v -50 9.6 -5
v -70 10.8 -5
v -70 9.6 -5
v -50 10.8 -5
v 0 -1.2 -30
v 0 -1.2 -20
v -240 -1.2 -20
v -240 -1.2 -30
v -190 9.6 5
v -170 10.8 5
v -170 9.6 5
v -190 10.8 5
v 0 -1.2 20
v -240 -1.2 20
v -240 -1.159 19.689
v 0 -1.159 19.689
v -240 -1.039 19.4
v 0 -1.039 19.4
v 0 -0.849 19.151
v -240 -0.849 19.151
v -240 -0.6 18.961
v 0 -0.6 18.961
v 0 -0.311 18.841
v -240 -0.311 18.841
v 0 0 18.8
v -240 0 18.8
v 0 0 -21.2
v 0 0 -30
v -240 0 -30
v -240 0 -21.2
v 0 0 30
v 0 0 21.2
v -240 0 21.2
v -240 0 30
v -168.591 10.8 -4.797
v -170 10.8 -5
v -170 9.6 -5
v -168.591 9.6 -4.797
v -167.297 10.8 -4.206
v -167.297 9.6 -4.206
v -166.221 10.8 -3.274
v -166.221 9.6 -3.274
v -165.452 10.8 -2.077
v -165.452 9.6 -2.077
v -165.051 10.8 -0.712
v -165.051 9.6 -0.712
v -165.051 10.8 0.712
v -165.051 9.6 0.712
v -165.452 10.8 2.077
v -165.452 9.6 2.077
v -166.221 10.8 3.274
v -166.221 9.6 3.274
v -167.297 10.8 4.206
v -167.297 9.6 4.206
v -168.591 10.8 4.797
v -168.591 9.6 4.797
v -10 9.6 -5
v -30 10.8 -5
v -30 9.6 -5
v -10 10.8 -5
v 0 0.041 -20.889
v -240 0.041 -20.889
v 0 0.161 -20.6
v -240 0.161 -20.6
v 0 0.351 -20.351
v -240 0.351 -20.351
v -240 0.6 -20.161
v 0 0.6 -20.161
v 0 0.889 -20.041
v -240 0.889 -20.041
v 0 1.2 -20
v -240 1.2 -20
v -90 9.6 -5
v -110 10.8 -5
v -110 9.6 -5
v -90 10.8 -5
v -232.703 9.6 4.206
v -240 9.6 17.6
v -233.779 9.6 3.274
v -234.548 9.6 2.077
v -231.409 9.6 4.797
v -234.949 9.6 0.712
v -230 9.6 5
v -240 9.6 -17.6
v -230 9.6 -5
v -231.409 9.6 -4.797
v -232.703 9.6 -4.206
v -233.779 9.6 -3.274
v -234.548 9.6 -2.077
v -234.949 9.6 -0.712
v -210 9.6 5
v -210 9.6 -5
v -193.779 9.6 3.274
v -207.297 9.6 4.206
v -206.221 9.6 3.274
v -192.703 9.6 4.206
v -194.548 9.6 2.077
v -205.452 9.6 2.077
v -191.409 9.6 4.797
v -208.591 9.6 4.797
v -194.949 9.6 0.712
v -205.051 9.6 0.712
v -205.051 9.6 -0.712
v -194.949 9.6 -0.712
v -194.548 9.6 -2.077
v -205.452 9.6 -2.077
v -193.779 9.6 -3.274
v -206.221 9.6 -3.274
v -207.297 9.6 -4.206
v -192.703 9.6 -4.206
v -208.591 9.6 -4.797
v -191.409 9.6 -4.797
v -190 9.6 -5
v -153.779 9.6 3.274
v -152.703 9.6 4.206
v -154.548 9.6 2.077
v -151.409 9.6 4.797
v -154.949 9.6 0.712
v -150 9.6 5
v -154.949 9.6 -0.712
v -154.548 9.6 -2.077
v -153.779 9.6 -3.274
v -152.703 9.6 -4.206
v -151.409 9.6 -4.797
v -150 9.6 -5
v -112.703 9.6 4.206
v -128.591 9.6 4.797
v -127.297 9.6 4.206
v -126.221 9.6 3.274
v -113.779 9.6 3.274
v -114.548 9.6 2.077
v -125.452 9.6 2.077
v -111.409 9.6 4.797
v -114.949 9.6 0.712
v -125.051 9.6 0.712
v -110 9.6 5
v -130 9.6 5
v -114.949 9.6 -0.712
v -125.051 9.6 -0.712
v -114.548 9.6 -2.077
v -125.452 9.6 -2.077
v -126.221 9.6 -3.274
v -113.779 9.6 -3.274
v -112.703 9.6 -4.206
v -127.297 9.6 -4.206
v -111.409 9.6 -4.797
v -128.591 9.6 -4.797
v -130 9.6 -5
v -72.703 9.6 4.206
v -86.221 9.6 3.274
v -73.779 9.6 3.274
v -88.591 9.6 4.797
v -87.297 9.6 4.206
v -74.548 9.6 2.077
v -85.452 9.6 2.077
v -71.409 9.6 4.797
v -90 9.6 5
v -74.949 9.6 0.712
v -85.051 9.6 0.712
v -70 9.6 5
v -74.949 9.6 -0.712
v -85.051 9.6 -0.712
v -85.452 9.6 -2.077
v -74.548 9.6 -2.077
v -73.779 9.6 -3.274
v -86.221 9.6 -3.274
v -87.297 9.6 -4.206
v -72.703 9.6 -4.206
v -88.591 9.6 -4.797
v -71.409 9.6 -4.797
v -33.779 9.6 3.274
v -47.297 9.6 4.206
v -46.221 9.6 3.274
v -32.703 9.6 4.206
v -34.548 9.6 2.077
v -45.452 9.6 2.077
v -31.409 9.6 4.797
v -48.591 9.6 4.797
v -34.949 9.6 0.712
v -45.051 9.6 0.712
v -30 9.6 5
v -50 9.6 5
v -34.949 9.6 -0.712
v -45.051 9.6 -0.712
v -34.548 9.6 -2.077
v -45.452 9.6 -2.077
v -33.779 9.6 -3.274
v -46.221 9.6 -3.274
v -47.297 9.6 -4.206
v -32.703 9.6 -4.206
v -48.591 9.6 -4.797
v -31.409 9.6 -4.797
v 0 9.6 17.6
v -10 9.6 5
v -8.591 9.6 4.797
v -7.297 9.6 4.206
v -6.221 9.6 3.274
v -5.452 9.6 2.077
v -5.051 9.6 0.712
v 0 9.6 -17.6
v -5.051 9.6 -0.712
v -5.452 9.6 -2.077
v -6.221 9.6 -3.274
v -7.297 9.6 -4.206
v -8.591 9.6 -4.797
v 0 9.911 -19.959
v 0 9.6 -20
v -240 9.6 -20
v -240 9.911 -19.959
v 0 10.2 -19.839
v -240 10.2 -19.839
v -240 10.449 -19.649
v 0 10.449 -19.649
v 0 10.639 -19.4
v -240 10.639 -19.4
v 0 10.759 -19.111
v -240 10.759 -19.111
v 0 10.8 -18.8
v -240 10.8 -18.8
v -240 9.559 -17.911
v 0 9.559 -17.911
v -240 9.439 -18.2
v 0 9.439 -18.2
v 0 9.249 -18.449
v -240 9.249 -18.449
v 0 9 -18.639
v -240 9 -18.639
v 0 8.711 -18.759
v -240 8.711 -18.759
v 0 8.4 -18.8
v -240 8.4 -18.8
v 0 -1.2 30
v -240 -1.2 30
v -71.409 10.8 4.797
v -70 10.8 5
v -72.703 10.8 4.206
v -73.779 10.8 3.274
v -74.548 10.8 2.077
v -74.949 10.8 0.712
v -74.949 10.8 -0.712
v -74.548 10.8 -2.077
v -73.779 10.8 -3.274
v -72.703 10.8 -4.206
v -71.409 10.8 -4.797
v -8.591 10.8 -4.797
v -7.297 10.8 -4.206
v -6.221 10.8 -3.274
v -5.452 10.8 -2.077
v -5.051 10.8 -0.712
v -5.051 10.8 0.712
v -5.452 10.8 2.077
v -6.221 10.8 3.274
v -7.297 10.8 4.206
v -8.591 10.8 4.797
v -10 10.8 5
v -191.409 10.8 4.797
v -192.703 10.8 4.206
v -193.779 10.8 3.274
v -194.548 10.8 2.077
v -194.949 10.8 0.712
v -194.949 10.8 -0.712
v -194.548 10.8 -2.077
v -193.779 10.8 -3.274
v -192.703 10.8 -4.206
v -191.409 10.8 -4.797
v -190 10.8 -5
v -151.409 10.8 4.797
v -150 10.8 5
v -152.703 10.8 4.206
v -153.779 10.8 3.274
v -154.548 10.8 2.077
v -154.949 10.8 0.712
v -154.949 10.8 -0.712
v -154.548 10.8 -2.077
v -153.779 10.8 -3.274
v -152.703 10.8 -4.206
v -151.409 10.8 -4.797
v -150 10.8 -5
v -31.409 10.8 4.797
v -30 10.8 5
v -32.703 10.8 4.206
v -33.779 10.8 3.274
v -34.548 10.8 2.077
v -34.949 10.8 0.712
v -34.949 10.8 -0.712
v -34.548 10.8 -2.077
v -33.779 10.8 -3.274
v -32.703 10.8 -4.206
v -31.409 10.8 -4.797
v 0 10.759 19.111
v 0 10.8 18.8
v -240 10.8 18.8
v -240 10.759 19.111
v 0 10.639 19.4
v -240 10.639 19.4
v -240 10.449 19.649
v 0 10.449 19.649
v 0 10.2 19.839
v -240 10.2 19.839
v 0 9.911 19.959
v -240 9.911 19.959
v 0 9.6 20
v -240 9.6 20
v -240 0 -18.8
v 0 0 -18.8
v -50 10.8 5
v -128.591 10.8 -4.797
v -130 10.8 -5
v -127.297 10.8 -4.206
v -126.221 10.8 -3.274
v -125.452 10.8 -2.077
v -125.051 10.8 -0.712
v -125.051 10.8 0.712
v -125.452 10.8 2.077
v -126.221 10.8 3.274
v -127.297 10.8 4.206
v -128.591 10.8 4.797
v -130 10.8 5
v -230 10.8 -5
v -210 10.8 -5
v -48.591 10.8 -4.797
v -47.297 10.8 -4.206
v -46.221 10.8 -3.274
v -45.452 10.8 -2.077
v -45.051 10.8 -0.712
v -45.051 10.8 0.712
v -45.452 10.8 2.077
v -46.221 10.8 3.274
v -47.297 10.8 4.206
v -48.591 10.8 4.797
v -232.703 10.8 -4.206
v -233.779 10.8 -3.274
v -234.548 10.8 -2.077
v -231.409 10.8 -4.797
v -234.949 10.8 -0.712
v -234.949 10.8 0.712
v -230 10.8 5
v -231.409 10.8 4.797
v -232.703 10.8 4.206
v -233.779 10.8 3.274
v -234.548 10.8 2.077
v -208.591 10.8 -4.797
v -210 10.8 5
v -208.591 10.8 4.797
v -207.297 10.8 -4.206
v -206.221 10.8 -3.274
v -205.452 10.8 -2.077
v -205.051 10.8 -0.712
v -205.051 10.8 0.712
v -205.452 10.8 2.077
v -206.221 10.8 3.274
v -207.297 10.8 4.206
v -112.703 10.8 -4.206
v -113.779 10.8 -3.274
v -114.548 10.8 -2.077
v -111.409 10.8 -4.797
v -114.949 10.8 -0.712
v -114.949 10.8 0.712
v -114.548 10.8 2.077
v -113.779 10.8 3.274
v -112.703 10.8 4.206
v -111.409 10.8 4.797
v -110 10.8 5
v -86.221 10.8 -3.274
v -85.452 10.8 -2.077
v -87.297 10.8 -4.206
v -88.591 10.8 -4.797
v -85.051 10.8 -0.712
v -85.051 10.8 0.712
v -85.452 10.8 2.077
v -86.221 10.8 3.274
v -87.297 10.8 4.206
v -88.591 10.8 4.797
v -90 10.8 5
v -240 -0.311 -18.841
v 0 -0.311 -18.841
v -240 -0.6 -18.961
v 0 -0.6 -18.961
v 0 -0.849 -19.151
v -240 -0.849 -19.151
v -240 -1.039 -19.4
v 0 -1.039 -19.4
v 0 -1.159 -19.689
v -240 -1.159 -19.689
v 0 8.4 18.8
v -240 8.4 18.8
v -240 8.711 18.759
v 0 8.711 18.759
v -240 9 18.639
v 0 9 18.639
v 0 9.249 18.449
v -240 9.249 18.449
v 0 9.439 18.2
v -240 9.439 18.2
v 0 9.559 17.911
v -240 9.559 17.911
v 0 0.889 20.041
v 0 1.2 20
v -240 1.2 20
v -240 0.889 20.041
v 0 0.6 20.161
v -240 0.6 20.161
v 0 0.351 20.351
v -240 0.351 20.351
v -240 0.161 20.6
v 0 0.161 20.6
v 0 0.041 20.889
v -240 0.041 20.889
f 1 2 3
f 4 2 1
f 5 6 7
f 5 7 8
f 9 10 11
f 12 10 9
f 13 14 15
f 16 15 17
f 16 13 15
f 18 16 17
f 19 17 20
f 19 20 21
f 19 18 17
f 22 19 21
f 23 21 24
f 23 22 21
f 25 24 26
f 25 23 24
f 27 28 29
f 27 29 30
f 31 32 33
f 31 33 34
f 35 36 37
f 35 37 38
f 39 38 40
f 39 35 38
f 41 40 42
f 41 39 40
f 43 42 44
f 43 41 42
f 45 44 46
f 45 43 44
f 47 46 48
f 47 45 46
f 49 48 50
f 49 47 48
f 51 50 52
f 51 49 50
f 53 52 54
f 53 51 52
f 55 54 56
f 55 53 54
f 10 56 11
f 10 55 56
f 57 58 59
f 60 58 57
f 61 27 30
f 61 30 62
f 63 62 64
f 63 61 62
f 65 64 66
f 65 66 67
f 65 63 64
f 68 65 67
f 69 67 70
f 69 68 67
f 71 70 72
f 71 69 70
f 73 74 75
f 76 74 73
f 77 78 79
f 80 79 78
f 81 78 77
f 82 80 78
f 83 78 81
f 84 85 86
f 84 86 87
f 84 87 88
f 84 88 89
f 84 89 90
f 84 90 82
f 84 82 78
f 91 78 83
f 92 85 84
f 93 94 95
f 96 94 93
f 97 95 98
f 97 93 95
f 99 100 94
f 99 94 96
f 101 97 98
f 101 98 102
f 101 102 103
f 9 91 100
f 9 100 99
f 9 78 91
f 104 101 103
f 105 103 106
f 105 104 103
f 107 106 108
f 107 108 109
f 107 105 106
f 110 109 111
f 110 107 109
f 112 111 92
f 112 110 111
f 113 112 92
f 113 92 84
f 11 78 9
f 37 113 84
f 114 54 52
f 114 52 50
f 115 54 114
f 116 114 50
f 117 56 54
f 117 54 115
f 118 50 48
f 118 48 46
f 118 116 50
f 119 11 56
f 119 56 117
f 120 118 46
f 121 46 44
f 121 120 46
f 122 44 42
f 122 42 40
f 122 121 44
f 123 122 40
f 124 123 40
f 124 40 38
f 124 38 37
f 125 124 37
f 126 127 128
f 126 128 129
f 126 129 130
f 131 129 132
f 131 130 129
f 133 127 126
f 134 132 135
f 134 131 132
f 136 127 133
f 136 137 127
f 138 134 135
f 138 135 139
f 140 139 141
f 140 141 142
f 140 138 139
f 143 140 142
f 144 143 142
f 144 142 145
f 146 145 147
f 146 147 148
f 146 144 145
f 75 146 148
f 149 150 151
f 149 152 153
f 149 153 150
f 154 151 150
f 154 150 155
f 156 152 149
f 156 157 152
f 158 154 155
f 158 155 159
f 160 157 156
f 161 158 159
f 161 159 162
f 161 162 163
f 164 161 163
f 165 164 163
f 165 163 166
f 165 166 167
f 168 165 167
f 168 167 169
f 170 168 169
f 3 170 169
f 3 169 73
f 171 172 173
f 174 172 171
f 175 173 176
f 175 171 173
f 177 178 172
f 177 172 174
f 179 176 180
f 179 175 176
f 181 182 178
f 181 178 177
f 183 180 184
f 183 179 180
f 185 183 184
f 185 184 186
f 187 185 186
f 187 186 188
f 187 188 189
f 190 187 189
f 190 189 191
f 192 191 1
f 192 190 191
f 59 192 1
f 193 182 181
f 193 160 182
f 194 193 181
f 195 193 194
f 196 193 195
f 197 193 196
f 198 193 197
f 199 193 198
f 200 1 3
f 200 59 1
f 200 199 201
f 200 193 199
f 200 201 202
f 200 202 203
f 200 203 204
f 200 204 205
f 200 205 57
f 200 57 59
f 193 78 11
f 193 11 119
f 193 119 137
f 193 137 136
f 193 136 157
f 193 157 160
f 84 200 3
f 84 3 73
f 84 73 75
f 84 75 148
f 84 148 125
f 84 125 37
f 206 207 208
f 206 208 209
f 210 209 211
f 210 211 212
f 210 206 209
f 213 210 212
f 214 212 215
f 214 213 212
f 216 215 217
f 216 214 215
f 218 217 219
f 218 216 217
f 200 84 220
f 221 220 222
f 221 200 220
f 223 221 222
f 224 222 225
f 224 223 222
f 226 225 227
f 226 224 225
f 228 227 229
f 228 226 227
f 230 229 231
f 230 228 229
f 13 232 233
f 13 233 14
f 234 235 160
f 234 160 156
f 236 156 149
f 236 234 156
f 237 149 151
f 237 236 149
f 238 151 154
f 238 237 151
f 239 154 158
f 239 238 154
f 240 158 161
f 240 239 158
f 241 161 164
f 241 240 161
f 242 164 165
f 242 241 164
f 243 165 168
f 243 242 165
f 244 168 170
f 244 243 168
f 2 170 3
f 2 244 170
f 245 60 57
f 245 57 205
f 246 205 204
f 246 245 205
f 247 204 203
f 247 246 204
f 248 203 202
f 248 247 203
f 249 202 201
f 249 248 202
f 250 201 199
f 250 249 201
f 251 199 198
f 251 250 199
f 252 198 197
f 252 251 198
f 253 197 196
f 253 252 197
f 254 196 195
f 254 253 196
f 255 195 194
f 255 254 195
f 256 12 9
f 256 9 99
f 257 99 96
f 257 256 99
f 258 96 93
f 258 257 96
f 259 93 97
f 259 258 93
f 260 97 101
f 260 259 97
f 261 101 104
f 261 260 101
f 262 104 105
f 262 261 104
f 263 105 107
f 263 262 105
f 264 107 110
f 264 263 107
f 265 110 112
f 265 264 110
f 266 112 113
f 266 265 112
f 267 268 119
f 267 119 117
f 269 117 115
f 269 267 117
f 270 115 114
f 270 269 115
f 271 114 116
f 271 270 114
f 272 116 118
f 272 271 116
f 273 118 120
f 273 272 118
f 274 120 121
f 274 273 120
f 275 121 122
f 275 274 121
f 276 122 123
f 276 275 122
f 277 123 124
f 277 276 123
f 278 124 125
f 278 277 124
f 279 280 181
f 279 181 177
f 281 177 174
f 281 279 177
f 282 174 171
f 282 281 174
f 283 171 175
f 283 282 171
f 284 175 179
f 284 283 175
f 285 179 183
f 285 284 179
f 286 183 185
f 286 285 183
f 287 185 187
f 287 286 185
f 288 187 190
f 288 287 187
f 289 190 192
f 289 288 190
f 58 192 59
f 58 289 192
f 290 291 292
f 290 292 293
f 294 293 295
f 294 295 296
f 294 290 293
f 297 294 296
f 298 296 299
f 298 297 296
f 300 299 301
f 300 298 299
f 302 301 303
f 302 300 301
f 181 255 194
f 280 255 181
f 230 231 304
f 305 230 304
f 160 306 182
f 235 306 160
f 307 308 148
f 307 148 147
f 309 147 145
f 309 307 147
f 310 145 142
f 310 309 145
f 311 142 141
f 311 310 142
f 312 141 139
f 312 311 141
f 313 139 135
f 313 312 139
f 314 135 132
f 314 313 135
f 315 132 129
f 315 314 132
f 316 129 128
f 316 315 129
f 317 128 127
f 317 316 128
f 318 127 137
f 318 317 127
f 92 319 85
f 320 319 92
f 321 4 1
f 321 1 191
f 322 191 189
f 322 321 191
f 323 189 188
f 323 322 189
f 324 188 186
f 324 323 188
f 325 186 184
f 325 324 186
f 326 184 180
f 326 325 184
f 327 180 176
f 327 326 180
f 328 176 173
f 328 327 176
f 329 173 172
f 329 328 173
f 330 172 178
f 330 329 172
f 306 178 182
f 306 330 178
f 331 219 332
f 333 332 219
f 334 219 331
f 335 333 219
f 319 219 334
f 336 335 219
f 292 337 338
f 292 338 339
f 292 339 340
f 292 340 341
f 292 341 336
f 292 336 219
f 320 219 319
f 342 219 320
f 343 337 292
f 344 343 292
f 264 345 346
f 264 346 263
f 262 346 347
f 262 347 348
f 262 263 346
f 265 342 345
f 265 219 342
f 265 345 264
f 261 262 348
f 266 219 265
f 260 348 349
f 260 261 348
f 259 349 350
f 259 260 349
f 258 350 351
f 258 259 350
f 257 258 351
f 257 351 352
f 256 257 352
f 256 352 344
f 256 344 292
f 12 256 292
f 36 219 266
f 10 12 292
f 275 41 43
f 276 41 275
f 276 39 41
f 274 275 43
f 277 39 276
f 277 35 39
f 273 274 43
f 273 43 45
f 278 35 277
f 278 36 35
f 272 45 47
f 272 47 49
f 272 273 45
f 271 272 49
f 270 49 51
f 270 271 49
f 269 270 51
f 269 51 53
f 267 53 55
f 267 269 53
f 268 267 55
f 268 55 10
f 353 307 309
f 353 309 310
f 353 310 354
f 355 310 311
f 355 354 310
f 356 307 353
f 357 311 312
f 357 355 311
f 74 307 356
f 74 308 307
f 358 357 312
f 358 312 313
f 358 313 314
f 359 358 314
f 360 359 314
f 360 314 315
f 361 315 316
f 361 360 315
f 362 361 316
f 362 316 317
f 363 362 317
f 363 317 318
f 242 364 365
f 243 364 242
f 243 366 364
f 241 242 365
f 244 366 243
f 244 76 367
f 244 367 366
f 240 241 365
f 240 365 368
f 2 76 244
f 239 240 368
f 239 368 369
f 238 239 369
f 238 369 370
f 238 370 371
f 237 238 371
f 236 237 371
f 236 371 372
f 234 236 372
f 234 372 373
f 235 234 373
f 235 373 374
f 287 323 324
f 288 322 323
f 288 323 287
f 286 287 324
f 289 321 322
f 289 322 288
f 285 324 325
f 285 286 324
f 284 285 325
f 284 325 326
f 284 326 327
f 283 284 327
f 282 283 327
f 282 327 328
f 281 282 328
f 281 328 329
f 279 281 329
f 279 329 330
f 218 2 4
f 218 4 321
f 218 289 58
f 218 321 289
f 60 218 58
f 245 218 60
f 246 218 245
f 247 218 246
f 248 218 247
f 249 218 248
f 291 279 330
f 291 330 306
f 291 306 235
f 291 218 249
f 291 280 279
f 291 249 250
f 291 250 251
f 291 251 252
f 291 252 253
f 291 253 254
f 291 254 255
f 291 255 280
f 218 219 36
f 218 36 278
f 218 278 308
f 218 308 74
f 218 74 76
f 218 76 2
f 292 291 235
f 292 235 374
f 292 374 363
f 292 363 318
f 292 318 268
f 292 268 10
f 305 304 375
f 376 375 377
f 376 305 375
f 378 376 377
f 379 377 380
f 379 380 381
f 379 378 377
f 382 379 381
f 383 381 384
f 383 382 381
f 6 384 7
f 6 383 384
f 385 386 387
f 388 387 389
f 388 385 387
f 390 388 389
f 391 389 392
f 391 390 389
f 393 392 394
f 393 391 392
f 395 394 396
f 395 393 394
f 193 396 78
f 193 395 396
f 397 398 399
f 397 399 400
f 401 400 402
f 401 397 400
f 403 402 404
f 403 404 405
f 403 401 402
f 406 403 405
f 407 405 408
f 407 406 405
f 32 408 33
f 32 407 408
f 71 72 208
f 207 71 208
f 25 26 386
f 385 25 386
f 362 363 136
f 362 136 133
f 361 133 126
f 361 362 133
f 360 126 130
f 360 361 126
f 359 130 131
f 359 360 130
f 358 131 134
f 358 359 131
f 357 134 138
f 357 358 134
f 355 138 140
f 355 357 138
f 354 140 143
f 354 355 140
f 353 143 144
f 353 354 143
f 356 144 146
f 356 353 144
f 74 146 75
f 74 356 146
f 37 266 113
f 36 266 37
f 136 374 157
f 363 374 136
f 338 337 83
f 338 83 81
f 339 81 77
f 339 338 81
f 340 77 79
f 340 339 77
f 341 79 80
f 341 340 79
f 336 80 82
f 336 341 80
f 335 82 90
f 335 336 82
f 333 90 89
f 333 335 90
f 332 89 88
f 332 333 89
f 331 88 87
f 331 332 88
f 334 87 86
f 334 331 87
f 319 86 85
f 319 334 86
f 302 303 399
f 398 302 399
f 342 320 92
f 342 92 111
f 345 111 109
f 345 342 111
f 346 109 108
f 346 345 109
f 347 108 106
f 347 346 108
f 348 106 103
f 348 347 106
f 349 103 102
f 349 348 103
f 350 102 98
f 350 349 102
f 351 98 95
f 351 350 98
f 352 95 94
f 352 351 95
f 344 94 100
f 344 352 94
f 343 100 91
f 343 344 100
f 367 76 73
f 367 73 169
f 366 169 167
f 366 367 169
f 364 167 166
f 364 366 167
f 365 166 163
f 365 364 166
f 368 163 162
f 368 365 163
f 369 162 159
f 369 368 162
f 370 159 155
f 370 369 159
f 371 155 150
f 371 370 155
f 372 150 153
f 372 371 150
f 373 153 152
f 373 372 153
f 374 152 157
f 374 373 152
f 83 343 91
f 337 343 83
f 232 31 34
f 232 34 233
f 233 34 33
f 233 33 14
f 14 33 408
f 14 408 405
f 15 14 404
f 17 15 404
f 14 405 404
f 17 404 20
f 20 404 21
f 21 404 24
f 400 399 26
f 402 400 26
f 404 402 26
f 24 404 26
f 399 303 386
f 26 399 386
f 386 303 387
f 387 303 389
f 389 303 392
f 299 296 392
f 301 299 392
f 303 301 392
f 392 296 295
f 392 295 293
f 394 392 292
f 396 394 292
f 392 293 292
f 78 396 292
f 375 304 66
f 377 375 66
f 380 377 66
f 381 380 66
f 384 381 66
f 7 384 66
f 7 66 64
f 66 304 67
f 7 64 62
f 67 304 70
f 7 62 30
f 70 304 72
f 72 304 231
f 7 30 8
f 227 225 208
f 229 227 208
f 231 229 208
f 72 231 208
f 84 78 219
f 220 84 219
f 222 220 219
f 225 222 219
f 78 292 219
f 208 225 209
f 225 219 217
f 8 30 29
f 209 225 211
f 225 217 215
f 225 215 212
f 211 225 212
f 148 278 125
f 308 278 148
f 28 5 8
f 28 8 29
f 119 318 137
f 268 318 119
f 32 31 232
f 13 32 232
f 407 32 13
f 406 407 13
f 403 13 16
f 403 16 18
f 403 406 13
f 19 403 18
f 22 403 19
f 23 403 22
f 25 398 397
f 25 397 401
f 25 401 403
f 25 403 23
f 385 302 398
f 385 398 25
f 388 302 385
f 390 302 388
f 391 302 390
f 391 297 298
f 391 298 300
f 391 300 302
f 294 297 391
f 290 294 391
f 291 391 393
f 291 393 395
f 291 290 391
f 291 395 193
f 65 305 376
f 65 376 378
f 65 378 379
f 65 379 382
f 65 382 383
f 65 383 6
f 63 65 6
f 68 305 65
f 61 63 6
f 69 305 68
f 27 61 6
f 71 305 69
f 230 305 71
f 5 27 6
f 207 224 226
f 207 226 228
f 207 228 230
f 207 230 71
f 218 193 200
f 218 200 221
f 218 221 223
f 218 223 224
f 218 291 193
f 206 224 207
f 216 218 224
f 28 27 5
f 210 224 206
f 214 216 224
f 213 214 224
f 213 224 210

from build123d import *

# Parameters (mm, degrees)
BOSS_EXTRUDE1_DEPTH = 240
CUT_EXTRUDE1_DEPTH  = 243.165232847


with BuildPart() as part:
    # Sketch1 → Boss-Extrude1 (new body)
    with BuildSketch(Plane(origin=(0, 0, 0), x_dir=(0, 0, -1), z_dir=(1, 0, 0))):
        with BuildLine():
            Line((-21.2, 0), (-30, 0))
            Line((-30, 0), (-30, -1.2))
            Line((-30, -1.2), (-20, -1.2))
            ThreePointArc((-20, -1.2), (-19.151471863, -0.848528137), (-18.8, 0))
            Line((-18.8, 0), (-18.8, 8.4))
            ThreePointArc((-18.8, 8.4), (-18.448528137, 9.248528137), (-17.6, 9.6))
            Line((-17.6, 9.6), (17.6, 9.6))
            ThreePointArc((17.6, 9.6), (18.448528137, 9.248528137), (18.8, 8.4))
            Line((18.8, 8.4), (18.8, 0))
            ThreePointArc((18.8, 0), (19.151471863, -0.848528137), (20, -1.2))
            Line((20, -1.2), (30, -1.2))
            Line((30, -1.2), (30, 0))
            Line((30, 0), (21.2, 0))
            ThreePointArc((21.2, 0), (20.351471863, 0.351471863), (20, 1.2))
            Line((20, 1.2), (20, 9.6))
            ThreePointArc((20, 9.6), (19.648528137, 10.448528137), (18.8, 10.8))
            Line((18.8, 10.8), (-18.8, 10.8))
            ThreePointArc((-18.8, 10.8), (-19.648528137, 10.448528137), (-20, 9.6))
            Line((-20, 9.6), (-20, 1.2))
            ThreePointArc((-20, 1.2), (-20.351471863, 0.351471863), (-21.2, 0))
        make_face()
    extrude(amount=-BOSS_EXTRUDE1_DEPTH)

    # Sketch2 → Cut-Extrude1 (cut, through all)
    with BuildSketch(Plane(origin=(0, 10.8, 0), x_dir=(1, 0, 0), z_dir=(0, 1, 0))):
        with BuildLine():
            Line((-230, 5), (-210, 5))
            ThreePointArc((-210, 5), (-205, 0), (-210, -5))
            Line((-210, -5), (-230, -5))
            ThreePointArc((-230, -5), (-235, 0), (-230, 5))
        make_face()
        with BuildLine():
            Line((-190, 5), (-170, 5))
            ThreePointArc((-170, 5), (-165, 0), (-170, -5))
            Line((-170, -5), (-190, -5))
            ThreePointArc((-190, -5), (-195, 0), (-190, 5))
        make_face()
        with BuildLine():
            Line((-150, 5), (-130, 5))
            ThreePointArc((-130, 5), (-125, 0), (-130, -5))
            Line((-130, -5), (-150, -5))
            ThreePointArc((-150, -5), (-155, 0), (-150, 5))
        make_face()
        with BuildLine():
            Line((-110, 5), (-90, 5))
            ThreePointArc((-90, 5), (-85, 0), (-90, -5))
            Line((-90, -5), (-110, -5))
            ThreePointArc((-110, -5), (-115, 0), (-110, 5))
        make_face()
        with BuildLine():
            Line((-70, 5), (-50, 5))
            ThreePointArc((-50, 5), (-45, 0), (-50, -5))
            Line((-50, -5), (-70, -5))
            ThreePointArc((-70, -5), (-75, 0), (-70, 5))
        make_face()
        with BuildLine():
            Line((-30, 5), (-10, 5))
            ThreePointArc((-10, 5), (-5, 0), (-10, -5))
            Line((-10, -5), (-30, -5))
            ThreePointArc((-30, -5), (-35, 0), (-30, 5))
        make_face()
    extrude(amount=-CUT_EXTRUDE1_DEPTH, mode=Mode.SUBTRACT)


solid = part.part
